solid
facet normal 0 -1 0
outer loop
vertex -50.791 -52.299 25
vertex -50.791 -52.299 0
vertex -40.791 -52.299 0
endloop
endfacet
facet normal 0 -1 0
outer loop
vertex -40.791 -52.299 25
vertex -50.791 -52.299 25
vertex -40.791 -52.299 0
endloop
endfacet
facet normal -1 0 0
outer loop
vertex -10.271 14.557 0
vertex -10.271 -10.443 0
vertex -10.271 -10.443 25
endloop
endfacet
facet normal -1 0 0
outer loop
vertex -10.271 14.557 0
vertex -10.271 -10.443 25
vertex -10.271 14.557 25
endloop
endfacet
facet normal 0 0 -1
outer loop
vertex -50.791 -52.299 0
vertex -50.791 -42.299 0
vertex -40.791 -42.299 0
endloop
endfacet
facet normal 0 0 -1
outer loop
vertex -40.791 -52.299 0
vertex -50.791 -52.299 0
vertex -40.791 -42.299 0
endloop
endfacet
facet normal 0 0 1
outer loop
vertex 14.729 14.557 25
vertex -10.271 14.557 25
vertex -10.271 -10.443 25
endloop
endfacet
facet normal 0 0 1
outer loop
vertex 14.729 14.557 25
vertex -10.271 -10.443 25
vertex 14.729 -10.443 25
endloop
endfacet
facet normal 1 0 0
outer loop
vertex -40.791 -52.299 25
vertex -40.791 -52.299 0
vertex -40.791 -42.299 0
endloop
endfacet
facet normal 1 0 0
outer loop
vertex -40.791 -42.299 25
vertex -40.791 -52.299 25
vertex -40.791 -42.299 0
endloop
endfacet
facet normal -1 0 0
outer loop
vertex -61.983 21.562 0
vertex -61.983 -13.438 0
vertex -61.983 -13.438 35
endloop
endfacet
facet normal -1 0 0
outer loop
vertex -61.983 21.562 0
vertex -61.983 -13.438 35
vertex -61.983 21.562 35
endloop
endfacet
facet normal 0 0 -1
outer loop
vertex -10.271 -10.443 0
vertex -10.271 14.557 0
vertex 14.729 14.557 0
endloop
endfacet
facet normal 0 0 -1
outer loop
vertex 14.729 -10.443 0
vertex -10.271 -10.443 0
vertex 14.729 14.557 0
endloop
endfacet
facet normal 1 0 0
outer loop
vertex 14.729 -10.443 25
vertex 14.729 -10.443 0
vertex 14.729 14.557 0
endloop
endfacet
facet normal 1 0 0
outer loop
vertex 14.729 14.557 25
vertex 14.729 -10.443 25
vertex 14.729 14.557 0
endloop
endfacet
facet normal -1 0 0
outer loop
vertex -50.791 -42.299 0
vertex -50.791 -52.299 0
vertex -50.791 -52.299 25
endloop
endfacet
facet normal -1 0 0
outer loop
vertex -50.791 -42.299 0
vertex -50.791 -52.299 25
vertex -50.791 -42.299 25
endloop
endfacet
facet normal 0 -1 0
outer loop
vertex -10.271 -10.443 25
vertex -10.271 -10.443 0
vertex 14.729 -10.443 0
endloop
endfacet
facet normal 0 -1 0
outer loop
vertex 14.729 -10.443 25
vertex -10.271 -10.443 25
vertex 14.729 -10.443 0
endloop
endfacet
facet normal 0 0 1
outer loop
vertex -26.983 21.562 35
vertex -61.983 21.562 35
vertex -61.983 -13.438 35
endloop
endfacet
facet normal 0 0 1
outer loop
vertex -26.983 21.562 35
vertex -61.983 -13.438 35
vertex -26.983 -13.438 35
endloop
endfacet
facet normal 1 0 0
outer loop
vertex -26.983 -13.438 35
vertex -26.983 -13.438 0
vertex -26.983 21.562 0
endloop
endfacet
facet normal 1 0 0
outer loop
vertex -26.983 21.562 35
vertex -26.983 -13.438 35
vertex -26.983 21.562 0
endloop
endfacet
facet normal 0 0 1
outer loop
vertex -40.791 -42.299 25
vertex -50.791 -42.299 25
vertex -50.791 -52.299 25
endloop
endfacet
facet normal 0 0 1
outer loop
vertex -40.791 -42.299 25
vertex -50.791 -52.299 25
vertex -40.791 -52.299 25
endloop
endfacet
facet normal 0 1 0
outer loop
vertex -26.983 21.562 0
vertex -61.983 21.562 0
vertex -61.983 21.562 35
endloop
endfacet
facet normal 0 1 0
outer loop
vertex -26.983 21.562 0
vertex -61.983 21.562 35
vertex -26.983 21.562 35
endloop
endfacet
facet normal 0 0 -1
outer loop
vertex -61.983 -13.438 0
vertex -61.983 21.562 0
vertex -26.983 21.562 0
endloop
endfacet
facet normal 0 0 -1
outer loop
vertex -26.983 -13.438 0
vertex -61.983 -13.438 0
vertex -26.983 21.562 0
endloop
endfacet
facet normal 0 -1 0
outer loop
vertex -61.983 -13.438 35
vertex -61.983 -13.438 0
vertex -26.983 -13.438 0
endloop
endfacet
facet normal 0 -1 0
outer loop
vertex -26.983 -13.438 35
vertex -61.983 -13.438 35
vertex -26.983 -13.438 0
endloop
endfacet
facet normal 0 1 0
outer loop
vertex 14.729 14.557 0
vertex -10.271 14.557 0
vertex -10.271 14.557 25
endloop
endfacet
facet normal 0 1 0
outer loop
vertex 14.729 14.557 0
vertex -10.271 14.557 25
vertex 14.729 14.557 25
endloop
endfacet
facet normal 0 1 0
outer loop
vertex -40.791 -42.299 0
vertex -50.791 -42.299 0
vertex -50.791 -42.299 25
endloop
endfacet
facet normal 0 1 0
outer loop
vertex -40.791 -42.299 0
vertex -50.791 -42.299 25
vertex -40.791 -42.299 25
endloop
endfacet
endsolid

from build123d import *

# Parameters (mm, degrees)
F0_W     = 25
F0_H     = 25
F1_DEPTH = 25
F2_W     = 35
F2_H     = 35
F3_DEPTH = 35
F4_W     = 10
F4_H     = 10
F5_DEPTH = 25


with BuildPart() as f1:
    # F0 (on Top) → F1 (new body)
    with BuildSketch(Plane.XY):
        with Locations((2.228773, 2.056592)):
            Rectangle(F0_W, F0_H)
    extrude(amount=F1_DEPTH)


with BuildPart() as f3:
    # F2 (on Top) → F3 (new body)
    with BuildSketch(Plane.XY):
        with Locations((-44.482607, 4.062314)):
            Rectangle(F2_W, F2_H)
    extrude(amount=F3_DEPTH)


with BuildPart() as f5:
    # F4 (on Top) → F5 (new body)
    with BuildSketch(Plane.XY):
        with Locations((-45.791328, -47.299282)):
            Rectangle(F4_W, F4_H)
    extrude(amount=F5_DEPTH)


solid = Compound([f1.part, f3.part, f5.part])
